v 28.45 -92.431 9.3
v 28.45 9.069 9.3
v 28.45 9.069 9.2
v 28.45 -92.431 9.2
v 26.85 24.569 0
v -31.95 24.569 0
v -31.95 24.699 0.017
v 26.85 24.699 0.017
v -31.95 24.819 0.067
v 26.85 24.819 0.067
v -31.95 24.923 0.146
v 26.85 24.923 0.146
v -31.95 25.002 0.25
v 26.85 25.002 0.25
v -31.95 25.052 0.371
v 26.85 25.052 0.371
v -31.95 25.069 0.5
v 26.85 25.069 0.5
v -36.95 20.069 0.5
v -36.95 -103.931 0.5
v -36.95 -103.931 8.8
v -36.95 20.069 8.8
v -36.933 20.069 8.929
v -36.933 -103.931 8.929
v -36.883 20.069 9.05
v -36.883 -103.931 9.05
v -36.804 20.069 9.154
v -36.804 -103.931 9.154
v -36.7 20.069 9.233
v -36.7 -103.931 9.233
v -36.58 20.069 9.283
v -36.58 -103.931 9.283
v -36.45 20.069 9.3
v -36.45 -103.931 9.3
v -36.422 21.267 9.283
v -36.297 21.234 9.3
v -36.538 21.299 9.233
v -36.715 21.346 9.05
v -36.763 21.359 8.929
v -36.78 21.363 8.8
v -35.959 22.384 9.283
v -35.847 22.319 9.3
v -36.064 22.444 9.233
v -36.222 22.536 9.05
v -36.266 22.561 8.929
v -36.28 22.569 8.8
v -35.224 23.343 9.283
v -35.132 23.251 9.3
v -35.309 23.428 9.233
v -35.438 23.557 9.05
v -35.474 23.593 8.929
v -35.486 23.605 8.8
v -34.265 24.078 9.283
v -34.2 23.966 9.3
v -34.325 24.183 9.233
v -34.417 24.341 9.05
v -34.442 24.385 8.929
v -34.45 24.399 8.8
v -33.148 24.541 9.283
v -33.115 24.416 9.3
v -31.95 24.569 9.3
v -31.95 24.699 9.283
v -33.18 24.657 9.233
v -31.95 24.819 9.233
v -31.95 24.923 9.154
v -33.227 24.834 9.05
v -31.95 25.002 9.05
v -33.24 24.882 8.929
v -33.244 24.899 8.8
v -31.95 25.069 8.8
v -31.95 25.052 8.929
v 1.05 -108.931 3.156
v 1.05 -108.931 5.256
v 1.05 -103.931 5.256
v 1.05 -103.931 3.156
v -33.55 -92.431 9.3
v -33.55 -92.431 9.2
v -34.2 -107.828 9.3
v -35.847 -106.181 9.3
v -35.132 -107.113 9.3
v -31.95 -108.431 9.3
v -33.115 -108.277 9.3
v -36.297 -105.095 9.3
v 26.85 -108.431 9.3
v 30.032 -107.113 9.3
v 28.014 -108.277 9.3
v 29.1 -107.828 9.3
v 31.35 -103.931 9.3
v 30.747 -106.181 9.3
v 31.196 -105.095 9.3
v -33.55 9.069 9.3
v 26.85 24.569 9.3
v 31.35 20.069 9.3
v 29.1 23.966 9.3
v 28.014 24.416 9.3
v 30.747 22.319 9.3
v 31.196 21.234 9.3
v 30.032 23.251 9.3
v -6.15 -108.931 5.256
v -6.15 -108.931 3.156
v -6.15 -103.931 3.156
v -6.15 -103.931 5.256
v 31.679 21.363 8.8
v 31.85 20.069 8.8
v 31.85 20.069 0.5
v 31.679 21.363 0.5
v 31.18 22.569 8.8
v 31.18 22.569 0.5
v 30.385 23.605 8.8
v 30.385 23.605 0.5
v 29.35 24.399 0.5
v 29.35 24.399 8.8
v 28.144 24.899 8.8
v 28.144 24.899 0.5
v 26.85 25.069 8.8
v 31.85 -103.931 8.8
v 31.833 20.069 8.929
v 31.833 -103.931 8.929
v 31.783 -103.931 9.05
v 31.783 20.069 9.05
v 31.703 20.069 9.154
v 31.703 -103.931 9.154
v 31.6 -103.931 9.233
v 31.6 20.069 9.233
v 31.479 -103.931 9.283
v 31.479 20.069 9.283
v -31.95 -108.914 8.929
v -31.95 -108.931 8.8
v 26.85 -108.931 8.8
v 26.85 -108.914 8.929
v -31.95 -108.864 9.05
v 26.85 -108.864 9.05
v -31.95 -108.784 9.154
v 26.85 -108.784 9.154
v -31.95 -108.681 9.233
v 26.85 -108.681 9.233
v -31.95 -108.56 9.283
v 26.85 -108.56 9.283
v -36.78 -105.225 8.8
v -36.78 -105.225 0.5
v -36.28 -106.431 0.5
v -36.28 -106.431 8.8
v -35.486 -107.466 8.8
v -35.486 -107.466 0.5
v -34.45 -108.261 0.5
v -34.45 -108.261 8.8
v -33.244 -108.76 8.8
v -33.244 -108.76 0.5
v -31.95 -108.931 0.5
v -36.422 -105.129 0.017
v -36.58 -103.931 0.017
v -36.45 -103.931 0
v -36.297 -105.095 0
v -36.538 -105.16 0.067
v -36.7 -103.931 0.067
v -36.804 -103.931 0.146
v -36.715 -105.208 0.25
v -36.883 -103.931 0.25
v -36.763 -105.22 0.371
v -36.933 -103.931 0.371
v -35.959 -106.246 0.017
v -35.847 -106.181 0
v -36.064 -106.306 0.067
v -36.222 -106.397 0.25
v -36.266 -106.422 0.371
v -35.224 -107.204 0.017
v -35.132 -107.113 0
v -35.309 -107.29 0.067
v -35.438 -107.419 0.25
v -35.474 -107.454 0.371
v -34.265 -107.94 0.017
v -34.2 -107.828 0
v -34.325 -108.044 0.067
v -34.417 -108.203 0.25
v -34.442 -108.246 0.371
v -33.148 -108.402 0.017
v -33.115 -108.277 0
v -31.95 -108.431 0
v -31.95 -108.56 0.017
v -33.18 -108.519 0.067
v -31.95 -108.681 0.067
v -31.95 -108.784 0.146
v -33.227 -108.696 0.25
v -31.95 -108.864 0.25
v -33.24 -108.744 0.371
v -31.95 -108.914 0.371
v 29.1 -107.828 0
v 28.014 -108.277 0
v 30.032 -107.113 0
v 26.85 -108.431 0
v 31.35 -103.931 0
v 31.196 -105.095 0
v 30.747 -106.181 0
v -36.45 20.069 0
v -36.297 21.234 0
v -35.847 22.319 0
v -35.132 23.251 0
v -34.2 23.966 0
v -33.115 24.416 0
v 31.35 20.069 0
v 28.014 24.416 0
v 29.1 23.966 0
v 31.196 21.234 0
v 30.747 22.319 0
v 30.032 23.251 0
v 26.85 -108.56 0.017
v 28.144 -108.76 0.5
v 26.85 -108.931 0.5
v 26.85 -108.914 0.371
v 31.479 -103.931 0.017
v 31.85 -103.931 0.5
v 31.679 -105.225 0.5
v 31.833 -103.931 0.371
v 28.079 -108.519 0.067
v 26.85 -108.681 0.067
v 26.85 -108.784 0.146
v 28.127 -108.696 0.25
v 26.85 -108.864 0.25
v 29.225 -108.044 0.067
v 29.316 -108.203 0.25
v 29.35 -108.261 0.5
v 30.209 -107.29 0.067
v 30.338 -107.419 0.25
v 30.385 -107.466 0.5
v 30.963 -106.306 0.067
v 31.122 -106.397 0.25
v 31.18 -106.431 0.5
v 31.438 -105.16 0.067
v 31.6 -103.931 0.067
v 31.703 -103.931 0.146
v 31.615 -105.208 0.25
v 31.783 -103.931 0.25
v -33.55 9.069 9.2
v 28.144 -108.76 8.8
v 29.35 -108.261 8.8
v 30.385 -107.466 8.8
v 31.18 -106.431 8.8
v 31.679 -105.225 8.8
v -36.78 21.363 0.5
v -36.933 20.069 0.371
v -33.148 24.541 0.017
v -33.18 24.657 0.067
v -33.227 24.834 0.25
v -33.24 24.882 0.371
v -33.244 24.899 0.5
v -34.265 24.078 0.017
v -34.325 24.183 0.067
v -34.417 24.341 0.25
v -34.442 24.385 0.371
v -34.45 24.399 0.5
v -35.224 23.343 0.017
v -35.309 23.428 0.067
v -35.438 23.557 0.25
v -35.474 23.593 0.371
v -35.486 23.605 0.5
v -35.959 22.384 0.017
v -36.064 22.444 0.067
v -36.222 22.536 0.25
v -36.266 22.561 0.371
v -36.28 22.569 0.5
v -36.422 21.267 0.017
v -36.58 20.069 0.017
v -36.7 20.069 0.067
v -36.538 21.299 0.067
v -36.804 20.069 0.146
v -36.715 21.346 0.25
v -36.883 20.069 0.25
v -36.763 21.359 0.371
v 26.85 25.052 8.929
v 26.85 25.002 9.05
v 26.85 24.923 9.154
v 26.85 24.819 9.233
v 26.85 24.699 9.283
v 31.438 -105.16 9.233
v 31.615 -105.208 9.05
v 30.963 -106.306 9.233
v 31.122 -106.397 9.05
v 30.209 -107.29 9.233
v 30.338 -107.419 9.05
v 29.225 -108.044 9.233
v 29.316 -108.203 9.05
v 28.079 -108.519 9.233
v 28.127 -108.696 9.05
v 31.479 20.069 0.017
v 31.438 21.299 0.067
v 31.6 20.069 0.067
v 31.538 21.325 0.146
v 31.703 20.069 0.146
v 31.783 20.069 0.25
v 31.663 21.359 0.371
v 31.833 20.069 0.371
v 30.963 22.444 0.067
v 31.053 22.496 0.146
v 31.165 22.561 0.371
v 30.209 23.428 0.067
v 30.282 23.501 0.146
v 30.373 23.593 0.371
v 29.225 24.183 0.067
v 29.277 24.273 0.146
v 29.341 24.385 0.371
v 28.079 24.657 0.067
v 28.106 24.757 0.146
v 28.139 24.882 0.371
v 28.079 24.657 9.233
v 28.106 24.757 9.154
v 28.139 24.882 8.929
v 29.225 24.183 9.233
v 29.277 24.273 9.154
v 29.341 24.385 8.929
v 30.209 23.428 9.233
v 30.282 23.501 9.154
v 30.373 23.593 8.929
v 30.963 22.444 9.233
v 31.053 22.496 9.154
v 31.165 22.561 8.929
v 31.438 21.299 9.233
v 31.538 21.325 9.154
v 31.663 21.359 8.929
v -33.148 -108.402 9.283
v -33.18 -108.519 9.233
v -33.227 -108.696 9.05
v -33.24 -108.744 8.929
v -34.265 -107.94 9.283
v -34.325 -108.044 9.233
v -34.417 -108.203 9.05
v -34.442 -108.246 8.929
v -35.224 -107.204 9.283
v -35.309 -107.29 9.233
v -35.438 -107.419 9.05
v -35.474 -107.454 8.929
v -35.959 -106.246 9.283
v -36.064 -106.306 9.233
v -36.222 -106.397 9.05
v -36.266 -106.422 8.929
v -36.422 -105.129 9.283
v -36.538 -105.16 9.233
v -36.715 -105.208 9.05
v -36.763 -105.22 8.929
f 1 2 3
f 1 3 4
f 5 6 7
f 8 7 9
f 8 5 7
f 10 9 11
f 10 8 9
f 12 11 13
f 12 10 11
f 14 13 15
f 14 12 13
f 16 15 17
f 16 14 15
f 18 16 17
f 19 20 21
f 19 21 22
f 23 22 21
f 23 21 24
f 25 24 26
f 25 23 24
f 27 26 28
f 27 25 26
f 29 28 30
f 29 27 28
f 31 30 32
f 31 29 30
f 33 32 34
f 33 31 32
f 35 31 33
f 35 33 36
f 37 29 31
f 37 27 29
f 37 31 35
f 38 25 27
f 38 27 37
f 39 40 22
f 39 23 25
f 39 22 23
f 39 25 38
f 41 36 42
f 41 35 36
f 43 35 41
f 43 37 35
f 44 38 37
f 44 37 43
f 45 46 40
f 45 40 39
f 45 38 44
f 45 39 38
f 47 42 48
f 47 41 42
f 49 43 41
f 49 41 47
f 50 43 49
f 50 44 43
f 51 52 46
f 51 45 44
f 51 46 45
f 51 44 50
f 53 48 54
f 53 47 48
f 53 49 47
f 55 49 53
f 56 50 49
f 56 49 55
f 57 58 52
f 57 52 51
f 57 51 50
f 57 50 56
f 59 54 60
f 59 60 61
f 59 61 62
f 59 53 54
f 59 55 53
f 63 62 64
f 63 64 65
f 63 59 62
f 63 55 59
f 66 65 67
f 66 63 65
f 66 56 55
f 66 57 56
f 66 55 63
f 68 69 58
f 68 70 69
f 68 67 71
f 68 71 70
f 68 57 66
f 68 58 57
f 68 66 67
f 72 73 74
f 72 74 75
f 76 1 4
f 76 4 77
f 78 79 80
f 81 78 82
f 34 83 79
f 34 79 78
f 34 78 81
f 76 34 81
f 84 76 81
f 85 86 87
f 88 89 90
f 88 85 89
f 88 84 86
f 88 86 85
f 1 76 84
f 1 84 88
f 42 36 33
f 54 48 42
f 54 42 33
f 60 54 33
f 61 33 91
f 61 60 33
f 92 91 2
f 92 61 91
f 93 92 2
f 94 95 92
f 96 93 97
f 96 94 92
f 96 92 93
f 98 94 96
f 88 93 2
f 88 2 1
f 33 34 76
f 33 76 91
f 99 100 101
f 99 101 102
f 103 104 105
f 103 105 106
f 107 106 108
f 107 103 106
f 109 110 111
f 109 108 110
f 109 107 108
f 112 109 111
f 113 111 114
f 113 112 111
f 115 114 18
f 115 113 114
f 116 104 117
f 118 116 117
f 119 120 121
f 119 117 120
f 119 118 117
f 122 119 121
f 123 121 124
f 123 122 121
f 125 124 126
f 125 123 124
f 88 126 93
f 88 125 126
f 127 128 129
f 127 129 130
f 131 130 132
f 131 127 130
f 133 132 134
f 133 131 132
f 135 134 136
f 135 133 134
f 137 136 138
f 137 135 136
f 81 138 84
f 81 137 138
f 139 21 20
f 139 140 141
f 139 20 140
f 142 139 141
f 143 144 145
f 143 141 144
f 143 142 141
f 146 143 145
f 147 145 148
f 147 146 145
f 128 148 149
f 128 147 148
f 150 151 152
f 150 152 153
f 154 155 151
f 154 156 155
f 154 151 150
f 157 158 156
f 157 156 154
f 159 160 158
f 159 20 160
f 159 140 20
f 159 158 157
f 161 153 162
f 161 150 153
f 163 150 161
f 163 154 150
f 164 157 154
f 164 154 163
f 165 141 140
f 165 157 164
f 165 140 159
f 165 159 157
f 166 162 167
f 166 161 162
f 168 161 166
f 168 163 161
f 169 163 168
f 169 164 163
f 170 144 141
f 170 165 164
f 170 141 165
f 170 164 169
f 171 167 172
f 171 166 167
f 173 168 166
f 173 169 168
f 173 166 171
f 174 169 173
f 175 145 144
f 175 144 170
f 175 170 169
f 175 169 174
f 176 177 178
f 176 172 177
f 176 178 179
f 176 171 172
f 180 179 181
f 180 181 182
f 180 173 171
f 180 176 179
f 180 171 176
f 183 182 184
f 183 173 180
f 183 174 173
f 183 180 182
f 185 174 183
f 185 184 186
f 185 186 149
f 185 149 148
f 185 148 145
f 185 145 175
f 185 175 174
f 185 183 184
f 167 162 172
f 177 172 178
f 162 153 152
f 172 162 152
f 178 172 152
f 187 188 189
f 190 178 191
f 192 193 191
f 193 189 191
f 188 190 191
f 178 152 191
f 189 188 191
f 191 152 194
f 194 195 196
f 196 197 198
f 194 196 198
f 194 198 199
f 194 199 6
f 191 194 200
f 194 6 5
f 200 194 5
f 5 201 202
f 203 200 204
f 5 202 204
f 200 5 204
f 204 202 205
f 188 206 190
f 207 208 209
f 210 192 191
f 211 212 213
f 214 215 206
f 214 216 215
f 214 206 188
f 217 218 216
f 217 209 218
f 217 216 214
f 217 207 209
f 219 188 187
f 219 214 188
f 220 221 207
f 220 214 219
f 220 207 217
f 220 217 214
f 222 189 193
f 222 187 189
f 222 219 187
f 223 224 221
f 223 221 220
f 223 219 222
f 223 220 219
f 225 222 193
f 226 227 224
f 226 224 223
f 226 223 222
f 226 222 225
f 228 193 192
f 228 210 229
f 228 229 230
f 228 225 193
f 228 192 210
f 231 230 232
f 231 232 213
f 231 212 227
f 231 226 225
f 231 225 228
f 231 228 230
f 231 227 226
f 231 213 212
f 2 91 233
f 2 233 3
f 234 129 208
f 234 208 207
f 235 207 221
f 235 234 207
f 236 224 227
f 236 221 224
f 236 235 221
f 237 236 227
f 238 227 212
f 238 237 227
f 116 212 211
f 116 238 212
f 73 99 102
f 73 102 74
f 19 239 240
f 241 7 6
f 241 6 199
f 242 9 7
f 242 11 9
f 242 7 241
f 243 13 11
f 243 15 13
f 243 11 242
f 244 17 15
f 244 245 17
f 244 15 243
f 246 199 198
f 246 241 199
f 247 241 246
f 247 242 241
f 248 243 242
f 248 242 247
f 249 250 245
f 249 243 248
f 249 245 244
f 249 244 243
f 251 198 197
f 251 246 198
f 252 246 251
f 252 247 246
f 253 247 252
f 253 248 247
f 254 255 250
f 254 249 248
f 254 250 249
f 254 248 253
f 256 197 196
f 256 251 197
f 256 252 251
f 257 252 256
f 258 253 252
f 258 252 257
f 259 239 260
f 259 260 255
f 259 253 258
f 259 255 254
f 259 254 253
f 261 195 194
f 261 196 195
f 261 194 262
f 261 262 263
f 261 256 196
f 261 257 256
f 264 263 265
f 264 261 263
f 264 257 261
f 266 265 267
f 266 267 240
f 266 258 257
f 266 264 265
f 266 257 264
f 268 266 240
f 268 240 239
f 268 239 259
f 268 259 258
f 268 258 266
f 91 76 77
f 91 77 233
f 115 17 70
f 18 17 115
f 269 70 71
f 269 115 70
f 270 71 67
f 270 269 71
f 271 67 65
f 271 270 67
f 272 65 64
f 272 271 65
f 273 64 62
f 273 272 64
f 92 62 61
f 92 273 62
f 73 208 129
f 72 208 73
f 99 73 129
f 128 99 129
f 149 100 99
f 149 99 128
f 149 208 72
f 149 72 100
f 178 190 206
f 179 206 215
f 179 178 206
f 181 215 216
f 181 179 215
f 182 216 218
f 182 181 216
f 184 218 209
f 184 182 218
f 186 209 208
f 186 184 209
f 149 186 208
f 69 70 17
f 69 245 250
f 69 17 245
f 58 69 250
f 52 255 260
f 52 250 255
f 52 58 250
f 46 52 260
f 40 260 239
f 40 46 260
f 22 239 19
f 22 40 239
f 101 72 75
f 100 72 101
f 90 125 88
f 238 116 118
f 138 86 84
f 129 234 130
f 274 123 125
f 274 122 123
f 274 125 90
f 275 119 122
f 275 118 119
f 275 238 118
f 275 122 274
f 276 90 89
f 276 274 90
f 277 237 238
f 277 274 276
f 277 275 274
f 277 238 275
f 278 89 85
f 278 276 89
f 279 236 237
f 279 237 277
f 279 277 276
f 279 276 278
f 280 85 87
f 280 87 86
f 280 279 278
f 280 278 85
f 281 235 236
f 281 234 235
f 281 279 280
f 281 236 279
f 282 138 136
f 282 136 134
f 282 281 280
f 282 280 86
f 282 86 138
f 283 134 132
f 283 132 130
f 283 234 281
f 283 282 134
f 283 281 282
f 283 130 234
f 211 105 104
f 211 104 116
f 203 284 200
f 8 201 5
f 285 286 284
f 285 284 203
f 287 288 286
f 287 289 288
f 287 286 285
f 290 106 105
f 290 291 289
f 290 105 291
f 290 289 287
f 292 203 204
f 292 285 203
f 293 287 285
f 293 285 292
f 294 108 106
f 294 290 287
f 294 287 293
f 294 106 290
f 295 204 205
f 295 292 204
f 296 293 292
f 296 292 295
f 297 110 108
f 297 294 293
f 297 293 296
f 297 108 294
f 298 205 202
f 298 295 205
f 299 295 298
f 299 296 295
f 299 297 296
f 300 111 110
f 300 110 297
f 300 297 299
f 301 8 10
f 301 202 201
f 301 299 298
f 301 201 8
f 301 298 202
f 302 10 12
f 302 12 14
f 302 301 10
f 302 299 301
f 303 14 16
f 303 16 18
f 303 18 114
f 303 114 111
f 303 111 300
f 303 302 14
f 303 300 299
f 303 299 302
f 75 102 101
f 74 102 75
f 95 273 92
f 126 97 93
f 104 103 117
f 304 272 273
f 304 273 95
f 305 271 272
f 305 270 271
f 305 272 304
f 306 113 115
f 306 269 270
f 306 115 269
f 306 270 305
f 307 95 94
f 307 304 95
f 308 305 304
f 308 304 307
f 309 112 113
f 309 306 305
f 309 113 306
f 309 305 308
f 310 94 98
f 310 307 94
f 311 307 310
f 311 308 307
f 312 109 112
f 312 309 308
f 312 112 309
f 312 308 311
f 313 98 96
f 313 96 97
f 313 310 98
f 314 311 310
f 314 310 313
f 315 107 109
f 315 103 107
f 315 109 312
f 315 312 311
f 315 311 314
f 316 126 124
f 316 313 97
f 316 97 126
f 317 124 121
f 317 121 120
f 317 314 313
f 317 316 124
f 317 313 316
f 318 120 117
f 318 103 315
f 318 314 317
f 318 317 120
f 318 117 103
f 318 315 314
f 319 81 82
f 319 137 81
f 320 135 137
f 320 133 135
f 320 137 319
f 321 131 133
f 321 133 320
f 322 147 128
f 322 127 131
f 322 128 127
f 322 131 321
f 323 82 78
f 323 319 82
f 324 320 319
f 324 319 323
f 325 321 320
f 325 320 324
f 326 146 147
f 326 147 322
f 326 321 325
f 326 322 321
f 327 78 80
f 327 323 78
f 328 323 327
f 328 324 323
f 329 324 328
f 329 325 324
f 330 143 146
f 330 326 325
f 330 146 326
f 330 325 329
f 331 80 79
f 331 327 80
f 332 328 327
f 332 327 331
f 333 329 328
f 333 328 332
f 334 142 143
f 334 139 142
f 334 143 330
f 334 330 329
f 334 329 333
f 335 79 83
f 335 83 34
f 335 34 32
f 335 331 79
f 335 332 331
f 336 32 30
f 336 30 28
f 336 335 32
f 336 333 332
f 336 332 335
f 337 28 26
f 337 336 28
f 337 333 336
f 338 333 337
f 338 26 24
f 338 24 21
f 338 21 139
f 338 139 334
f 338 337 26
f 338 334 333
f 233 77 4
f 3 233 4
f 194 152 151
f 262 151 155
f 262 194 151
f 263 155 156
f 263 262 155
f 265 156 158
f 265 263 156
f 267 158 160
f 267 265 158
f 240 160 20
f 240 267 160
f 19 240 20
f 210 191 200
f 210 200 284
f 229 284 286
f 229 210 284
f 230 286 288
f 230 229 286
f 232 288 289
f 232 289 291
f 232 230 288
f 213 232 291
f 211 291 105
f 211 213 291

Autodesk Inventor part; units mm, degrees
ref_plane "YZ Plane" through (0, 0, 0) normal (1, 0, 0) x (0, 1, 0)
ref_plane "XZ Plane" through (0, 0, 0) normal (0, 1, 0) x (-1, 0, 0)
ref_plane "XY Plane" through (0, 0, 0) normal (0, 0, 1) x (1, 0, 0)
sketch "Sketch1" plane through (0, 0, 0) normal (0, 0, 1) x (1, 0, 0)
  line L0 (-36.9502, 25.0692) -> (31.8498, 25.0692)
  line L1 (31.8498, 25.0692) -> (31.8498, -108.9308)
  line L2 (31.8498, -108.9308) -> (-36.9502, -108.9308)
  line L3 (-36.9502, -108.9308) -> (-36.9502, 25.0692)
  point P0 (0, 0)
  dimension "d0" = 68.8
  dimension "d1" = 134
extrude "Extrusion1" add sketch "Sketch1" along normal blind 9.3
sketch "Sketch2" plane through (0, 0, 9.3) normal (0, 0, 1) x (1, 0, 0)
  line L0 (-33.5502, 9.0692) -> (28.4498, 9.0692)
  line L1 (28.4498, 9.0692) -> (28.4498, -92.4308)
  line L2 (28.4498, -92.4308) -> (-33.5502, -92.4308)
  line L3 (-33.5502, -92.4308) -> (-33.5502, 9.0692)
  line L4 (-36.9502, 25.0692) -> (-36.9502, -108.9308) projected
  line L5 (31.8498, 25.0692) -> (-36.9502, 25.0692) projected
  line L6 (-36.9502, -108.9308) -> (31.8498, -108.9308) projected
  point P0 (0, 0)
  dimension "d4" = 62
  dimension "d5" = 3.4
  dimension "d6" = 16
  dimension "d7" = 16.5
extrude "Extrusion2" cut sketch "Sketch2" against normal blind 0.1
sketch "Sketch3" plane through (-36.9502, -108.9308, 0) normal (0, -1, 0) x (1, 0, 0)
  line L0 (30.8, 5.2565) -> (38, 5.2565)
  line L1 (38, 5.2565) -> (38, 3.1565)
  line L2 (38, 3.1565) -> (30.8, 3.1565)
  line L3 (30.8, 3.1565) -> (30.8, 5.2565)
  line L4 (0, 0) -> (0, 9.3) projected
  point P0 (36.9502, 0)
  dimension "d10" = 7.2
  dimension "d11" = 2.1
  dimension "d12" = 30.8
extrude "Extrusion3" cut sketch "Sketch3" against normal blind 5
fillet "Fillet1" radius 5 4 edges at (31.8498, -108.9308, 4.65) (-36.9502, -108.9308, 4.65) (31.8498, 25.0692, 4.65) (-36.9502, 25.0692, 4.65)
fillet "Fillet2" radius 0.5 16 edges at (30.3853, -107.4663, 9.3) (31.8498, -41.9308, 9.3) (30.3853, 23.6048, 9.3) (-2.5502, 25.0692, 9.3) (-35.4858, 23.6048, 9.3) (-36.9502, -41.9308, 9.3) (-35.4858, -107.4663, 9.3) (-2.5502, -108.9308, 9.3) (30.3853, -107.4663, 0) (-2.5502, -108.9308, 0) (-35.4858, -107.4663, 0) (-36.9502, -41.9308, 0) (-35.4858, 23.6048, 0) (-2.5502, 25.0692, 0) (30.3853, 23.6048, 0) (31.8498, -41.9308, 0)
properties part number "Nexus4"
